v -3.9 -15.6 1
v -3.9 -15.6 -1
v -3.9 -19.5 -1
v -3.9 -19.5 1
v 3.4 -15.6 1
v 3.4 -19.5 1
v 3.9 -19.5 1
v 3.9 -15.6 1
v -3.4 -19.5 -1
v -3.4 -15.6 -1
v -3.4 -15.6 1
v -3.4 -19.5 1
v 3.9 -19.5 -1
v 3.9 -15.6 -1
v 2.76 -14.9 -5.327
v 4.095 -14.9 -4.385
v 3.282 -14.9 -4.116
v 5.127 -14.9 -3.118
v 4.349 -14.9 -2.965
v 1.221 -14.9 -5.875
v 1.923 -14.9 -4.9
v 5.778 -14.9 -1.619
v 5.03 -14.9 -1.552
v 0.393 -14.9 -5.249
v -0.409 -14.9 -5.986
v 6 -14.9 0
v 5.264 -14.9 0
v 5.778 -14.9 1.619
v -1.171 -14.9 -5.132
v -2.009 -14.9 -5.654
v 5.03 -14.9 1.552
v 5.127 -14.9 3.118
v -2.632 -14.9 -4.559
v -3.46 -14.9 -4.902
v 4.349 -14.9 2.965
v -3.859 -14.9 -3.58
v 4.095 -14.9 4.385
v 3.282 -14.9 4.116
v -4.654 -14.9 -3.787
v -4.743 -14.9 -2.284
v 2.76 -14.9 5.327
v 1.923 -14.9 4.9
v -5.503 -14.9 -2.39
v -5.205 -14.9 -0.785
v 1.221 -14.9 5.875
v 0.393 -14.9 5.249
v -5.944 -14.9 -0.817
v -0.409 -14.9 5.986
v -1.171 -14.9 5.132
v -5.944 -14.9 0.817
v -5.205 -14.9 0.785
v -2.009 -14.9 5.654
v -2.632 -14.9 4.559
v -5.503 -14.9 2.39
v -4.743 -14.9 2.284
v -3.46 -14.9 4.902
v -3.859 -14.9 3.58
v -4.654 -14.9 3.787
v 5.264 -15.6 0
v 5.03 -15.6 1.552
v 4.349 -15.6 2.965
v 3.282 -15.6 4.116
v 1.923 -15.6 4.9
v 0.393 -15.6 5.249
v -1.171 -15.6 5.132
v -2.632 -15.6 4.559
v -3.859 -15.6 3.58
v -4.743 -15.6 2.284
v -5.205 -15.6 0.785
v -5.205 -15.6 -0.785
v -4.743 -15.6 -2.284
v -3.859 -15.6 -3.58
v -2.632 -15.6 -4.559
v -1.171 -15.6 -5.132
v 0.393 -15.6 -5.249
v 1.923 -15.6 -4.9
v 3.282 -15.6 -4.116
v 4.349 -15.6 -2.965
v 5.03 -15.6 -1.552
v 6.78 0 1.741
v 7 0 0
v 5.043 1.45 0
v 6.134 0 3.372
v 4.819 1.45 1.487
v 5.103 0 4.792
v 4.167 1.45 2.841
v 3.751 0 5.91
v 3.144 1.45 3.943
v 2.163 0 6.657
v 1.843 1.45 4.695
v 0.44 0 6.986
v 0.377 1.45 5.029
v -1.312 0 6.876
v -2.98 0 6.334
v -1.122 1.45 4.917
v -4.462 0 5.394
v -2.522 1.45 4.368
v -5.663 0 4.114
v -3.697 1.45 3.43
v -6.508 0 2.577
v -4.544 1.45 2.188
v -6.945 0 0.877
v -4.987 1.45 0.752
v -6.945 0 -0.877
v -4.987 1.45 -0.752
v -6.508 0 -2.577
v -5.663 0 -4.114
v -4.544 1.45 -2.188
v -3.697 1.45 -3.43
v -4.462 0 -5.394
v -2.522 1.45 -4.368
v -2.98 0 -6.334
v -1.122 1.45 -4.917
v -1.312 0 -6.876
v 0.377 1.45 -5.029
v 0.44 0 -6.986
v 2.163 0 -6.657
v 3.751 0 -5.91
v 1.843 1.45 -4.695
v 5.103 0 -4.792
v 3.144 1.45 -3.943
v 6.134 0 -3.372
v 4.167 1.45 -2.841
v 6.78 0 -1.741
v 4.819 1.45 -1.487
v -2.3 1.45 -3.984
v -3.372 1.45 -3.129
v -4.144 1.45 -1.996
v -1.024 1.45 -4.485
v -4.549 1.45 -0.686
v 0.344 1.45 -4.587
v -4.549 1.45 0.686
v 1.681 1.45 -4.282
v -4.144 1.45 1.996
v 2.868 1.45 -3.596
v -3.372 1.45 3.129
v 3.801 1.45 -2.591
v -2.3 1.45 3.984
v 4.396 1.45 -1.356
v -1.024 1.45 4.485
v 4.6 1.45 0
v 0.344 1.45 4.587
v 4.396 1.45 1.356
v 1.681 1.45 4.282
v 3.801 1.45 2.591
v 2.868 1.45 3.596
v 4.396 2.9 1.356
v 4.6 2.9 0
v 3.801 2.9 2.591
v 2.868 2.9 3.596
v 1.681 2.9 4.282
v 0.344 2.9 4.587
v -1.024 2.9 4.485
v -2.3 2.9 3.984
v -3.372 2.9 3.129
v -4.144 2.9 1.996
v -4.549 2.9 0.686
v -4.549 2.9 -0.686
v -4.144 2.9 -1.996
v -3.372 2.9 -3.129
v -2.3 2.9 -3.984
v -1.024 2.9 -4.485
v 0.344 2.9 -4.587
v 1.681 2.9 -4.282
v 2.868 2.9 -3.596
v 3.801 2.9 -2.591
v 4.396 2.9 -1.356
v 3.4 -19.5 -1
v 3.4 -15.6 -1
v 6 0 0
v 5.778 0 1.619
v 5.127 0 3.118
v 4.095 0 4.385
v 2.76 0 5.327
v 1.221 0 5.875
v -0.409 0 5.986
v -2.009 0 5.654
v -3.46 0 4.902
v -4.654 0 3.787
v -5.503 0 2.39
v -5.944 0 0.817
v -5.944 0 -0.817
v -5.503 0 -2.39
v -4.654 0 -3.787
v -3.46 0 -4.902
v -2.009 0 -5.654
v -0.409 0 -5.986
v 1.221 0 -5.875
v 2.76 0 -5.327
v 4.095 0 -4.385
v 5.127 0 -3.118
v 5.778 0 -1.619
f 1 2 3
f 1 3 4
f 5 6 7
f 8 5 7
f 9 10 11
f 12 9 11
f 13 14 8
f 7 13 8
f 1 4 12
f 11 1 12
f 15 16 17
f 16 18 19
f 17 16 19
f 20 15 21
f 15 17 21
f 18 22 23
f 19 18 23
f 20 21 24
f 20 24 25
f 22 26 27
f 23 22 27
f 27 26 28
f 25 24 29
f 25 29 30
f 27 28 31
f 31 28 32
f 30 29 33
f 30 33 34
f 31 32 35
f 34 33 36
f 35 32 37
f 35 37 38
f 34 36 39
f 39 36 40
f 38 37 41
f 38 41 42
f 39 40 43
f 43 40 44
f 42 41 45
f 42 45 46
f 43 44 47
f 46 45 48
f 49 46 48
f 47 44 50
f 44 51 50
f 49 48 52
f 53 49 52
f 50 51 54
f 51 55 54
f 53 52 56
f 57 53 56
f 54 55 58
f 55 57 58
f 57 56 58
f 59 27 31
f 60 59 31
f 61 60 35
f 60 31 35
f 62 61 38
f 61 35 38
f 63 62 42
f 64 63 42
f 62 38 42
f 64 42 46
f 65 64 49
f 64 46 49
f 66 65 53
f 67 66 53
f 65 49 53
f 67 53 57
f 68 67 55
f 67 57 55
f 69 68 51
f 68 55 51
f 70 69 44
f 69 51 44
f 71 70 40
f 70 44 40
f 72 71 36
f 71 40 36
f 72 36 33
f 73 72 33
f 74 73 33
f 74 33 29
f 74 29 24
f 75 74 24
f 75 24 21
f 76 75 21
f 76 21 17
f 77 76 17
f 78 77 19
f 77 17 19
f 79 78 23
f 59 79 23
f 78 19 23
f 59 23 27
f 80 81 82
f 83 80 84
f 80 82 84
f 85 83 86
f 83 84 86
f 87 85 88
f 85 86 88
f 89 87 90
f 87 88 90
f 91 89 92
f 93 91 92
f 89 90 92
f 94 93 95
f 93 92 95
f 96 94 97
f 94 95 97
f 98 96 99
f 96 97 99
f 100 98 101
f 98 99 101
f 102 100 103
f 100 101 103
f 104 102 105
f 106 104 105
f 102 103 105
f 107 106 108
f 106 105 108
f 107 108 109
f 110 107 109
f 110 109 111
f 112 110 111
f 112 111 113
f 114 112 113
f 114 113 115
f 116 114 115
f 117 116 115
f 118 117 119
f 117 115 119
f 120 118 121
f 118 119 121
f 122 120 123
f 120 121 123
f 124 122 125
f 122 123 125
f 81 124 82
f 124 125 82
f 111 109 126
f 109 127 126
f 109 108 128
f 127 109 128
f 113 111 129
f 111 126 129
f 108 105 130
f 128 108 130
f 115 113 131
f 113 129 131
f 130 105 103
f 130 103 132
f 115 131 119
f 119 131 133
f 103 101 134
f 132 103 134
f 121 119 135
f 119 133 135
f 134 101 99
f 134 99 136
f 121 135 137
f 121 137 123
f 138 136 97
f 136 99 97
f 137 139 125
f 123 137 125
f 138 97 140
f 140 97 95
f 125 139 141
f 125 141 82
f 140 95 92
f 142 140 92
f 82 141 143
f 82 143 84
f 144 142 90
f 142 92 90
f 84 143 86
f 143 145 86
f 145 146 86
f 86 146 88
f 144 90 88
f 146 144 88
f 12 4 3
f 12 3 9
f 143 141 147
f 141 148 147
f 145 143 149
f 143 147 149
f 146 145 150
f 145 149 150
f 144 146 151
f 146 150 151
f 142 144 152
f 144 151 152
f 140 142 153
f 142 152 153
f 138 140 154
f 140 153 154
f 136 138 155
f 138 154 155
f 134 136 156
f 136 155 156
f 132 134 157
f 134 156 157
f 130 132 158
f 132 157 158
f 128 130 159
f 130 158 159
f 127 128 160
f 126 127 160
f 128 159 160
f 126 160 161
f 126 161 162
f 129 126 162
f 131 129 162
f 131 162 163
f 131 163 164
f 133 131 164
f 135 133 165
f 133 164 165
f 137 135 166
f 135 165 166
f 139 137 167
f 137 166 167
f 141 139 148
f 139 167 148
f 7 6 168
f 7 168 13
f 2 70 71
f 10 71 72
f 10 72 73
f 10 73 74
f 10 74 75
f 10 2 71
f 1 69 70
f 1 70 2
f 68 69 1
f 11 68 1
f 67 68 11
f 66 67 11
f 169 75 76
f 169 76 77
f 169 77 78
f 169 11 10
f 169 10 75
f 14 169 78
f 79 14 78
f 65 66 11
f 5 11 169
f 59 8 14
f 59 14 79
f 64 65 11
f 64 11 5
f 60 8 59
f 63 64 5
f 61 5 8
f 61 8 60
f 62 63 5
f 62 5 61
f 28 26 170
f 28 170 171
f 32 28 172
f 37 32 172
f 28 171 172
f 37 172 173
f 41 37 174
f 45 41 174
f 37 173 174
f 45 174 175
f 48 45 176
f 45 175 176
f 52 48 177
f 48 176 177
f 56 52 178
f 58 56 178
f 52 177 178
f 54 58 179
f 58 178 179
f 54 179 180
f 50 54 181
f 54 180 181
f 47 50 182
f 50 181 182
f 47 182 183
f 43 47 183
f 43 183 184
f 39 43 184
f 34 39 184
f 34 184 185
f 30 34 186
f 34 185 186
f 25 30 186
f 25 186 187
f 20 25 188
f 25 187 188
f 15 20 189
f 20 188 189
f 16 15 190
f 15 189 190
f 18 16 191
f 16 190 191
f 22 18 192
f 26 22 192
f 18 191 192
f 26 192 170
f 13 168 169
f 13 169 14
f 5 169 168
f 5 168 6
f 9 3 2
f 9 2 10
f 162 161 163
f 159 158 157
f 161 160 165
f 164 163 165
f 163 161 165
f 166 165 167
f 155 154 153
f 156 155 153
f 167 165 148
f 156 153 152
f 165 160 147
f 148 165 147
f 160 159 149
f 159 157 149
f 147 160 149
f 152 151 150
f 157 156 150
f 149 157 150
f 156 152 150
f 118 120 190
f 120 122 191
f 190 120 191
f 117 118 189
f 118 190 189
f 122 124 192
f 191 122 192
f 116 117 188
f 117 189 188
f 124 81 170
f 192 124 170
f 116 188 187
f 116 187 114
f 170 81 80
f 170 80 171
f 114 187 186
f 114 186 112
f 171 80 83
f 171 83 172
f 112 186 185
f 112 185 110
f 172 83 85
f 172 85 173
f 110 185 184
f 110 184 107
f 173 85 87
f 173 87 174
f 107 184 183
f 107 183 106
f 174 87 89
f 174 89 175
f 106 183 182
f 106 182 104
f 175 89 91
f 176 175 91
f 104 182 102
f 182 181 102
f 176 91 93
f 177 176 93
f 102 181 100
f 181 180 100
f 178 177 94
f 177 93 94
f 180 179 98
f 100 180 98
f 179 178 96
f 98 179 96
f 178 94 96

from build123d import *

# Parameters (mm, degrees)
SKETCH2_R           = 5.264069535
BOSS_EXTRUDE1_DEPTH = 0.7
SKETCH3_W           = 0.5
SKETCH3_H           = 2
BOSS_EXTRUDE2_DEPTH = 3.9


with BuildPart() as part:
    # Sketch1 → Revolve1 (revolve)
    with BuildSketch(Plane.XY):
        Polygon((0, -14.9), (6, -14.9), (6, 0), (7, 0), (5.043279744, 1.45), (4.6, 1.45), (4.6, 2.9), (0, 2.9), align=None)
    revolve(axis=Axis((0, 2.9, 0), (0, -1, 0)))

    # Sketch2 → Boss-Extrude1 (add)
    with BuildSketch(Plane.XZ.offset(14.9)):
        Circle(SKETCH2_R)
    extrude(amount=BOSS_EXTRUDE1_DEPTH)

    # Sketch3 → Boss-Extrude2 (add)
    with BuildSketch(Plane.XZ.offset(15.6)):
        with Locations((-3.65, 0)):
            Rectangle(SKETCH3_W, SKETCH3_H)
        with Locations((3.65, 0)):
            Rectangle(SKETCH3_W, SKETCH3_H)
    extrude(amount=BOSS_EXTRUDE2_DEPTH)


solid = part.part
